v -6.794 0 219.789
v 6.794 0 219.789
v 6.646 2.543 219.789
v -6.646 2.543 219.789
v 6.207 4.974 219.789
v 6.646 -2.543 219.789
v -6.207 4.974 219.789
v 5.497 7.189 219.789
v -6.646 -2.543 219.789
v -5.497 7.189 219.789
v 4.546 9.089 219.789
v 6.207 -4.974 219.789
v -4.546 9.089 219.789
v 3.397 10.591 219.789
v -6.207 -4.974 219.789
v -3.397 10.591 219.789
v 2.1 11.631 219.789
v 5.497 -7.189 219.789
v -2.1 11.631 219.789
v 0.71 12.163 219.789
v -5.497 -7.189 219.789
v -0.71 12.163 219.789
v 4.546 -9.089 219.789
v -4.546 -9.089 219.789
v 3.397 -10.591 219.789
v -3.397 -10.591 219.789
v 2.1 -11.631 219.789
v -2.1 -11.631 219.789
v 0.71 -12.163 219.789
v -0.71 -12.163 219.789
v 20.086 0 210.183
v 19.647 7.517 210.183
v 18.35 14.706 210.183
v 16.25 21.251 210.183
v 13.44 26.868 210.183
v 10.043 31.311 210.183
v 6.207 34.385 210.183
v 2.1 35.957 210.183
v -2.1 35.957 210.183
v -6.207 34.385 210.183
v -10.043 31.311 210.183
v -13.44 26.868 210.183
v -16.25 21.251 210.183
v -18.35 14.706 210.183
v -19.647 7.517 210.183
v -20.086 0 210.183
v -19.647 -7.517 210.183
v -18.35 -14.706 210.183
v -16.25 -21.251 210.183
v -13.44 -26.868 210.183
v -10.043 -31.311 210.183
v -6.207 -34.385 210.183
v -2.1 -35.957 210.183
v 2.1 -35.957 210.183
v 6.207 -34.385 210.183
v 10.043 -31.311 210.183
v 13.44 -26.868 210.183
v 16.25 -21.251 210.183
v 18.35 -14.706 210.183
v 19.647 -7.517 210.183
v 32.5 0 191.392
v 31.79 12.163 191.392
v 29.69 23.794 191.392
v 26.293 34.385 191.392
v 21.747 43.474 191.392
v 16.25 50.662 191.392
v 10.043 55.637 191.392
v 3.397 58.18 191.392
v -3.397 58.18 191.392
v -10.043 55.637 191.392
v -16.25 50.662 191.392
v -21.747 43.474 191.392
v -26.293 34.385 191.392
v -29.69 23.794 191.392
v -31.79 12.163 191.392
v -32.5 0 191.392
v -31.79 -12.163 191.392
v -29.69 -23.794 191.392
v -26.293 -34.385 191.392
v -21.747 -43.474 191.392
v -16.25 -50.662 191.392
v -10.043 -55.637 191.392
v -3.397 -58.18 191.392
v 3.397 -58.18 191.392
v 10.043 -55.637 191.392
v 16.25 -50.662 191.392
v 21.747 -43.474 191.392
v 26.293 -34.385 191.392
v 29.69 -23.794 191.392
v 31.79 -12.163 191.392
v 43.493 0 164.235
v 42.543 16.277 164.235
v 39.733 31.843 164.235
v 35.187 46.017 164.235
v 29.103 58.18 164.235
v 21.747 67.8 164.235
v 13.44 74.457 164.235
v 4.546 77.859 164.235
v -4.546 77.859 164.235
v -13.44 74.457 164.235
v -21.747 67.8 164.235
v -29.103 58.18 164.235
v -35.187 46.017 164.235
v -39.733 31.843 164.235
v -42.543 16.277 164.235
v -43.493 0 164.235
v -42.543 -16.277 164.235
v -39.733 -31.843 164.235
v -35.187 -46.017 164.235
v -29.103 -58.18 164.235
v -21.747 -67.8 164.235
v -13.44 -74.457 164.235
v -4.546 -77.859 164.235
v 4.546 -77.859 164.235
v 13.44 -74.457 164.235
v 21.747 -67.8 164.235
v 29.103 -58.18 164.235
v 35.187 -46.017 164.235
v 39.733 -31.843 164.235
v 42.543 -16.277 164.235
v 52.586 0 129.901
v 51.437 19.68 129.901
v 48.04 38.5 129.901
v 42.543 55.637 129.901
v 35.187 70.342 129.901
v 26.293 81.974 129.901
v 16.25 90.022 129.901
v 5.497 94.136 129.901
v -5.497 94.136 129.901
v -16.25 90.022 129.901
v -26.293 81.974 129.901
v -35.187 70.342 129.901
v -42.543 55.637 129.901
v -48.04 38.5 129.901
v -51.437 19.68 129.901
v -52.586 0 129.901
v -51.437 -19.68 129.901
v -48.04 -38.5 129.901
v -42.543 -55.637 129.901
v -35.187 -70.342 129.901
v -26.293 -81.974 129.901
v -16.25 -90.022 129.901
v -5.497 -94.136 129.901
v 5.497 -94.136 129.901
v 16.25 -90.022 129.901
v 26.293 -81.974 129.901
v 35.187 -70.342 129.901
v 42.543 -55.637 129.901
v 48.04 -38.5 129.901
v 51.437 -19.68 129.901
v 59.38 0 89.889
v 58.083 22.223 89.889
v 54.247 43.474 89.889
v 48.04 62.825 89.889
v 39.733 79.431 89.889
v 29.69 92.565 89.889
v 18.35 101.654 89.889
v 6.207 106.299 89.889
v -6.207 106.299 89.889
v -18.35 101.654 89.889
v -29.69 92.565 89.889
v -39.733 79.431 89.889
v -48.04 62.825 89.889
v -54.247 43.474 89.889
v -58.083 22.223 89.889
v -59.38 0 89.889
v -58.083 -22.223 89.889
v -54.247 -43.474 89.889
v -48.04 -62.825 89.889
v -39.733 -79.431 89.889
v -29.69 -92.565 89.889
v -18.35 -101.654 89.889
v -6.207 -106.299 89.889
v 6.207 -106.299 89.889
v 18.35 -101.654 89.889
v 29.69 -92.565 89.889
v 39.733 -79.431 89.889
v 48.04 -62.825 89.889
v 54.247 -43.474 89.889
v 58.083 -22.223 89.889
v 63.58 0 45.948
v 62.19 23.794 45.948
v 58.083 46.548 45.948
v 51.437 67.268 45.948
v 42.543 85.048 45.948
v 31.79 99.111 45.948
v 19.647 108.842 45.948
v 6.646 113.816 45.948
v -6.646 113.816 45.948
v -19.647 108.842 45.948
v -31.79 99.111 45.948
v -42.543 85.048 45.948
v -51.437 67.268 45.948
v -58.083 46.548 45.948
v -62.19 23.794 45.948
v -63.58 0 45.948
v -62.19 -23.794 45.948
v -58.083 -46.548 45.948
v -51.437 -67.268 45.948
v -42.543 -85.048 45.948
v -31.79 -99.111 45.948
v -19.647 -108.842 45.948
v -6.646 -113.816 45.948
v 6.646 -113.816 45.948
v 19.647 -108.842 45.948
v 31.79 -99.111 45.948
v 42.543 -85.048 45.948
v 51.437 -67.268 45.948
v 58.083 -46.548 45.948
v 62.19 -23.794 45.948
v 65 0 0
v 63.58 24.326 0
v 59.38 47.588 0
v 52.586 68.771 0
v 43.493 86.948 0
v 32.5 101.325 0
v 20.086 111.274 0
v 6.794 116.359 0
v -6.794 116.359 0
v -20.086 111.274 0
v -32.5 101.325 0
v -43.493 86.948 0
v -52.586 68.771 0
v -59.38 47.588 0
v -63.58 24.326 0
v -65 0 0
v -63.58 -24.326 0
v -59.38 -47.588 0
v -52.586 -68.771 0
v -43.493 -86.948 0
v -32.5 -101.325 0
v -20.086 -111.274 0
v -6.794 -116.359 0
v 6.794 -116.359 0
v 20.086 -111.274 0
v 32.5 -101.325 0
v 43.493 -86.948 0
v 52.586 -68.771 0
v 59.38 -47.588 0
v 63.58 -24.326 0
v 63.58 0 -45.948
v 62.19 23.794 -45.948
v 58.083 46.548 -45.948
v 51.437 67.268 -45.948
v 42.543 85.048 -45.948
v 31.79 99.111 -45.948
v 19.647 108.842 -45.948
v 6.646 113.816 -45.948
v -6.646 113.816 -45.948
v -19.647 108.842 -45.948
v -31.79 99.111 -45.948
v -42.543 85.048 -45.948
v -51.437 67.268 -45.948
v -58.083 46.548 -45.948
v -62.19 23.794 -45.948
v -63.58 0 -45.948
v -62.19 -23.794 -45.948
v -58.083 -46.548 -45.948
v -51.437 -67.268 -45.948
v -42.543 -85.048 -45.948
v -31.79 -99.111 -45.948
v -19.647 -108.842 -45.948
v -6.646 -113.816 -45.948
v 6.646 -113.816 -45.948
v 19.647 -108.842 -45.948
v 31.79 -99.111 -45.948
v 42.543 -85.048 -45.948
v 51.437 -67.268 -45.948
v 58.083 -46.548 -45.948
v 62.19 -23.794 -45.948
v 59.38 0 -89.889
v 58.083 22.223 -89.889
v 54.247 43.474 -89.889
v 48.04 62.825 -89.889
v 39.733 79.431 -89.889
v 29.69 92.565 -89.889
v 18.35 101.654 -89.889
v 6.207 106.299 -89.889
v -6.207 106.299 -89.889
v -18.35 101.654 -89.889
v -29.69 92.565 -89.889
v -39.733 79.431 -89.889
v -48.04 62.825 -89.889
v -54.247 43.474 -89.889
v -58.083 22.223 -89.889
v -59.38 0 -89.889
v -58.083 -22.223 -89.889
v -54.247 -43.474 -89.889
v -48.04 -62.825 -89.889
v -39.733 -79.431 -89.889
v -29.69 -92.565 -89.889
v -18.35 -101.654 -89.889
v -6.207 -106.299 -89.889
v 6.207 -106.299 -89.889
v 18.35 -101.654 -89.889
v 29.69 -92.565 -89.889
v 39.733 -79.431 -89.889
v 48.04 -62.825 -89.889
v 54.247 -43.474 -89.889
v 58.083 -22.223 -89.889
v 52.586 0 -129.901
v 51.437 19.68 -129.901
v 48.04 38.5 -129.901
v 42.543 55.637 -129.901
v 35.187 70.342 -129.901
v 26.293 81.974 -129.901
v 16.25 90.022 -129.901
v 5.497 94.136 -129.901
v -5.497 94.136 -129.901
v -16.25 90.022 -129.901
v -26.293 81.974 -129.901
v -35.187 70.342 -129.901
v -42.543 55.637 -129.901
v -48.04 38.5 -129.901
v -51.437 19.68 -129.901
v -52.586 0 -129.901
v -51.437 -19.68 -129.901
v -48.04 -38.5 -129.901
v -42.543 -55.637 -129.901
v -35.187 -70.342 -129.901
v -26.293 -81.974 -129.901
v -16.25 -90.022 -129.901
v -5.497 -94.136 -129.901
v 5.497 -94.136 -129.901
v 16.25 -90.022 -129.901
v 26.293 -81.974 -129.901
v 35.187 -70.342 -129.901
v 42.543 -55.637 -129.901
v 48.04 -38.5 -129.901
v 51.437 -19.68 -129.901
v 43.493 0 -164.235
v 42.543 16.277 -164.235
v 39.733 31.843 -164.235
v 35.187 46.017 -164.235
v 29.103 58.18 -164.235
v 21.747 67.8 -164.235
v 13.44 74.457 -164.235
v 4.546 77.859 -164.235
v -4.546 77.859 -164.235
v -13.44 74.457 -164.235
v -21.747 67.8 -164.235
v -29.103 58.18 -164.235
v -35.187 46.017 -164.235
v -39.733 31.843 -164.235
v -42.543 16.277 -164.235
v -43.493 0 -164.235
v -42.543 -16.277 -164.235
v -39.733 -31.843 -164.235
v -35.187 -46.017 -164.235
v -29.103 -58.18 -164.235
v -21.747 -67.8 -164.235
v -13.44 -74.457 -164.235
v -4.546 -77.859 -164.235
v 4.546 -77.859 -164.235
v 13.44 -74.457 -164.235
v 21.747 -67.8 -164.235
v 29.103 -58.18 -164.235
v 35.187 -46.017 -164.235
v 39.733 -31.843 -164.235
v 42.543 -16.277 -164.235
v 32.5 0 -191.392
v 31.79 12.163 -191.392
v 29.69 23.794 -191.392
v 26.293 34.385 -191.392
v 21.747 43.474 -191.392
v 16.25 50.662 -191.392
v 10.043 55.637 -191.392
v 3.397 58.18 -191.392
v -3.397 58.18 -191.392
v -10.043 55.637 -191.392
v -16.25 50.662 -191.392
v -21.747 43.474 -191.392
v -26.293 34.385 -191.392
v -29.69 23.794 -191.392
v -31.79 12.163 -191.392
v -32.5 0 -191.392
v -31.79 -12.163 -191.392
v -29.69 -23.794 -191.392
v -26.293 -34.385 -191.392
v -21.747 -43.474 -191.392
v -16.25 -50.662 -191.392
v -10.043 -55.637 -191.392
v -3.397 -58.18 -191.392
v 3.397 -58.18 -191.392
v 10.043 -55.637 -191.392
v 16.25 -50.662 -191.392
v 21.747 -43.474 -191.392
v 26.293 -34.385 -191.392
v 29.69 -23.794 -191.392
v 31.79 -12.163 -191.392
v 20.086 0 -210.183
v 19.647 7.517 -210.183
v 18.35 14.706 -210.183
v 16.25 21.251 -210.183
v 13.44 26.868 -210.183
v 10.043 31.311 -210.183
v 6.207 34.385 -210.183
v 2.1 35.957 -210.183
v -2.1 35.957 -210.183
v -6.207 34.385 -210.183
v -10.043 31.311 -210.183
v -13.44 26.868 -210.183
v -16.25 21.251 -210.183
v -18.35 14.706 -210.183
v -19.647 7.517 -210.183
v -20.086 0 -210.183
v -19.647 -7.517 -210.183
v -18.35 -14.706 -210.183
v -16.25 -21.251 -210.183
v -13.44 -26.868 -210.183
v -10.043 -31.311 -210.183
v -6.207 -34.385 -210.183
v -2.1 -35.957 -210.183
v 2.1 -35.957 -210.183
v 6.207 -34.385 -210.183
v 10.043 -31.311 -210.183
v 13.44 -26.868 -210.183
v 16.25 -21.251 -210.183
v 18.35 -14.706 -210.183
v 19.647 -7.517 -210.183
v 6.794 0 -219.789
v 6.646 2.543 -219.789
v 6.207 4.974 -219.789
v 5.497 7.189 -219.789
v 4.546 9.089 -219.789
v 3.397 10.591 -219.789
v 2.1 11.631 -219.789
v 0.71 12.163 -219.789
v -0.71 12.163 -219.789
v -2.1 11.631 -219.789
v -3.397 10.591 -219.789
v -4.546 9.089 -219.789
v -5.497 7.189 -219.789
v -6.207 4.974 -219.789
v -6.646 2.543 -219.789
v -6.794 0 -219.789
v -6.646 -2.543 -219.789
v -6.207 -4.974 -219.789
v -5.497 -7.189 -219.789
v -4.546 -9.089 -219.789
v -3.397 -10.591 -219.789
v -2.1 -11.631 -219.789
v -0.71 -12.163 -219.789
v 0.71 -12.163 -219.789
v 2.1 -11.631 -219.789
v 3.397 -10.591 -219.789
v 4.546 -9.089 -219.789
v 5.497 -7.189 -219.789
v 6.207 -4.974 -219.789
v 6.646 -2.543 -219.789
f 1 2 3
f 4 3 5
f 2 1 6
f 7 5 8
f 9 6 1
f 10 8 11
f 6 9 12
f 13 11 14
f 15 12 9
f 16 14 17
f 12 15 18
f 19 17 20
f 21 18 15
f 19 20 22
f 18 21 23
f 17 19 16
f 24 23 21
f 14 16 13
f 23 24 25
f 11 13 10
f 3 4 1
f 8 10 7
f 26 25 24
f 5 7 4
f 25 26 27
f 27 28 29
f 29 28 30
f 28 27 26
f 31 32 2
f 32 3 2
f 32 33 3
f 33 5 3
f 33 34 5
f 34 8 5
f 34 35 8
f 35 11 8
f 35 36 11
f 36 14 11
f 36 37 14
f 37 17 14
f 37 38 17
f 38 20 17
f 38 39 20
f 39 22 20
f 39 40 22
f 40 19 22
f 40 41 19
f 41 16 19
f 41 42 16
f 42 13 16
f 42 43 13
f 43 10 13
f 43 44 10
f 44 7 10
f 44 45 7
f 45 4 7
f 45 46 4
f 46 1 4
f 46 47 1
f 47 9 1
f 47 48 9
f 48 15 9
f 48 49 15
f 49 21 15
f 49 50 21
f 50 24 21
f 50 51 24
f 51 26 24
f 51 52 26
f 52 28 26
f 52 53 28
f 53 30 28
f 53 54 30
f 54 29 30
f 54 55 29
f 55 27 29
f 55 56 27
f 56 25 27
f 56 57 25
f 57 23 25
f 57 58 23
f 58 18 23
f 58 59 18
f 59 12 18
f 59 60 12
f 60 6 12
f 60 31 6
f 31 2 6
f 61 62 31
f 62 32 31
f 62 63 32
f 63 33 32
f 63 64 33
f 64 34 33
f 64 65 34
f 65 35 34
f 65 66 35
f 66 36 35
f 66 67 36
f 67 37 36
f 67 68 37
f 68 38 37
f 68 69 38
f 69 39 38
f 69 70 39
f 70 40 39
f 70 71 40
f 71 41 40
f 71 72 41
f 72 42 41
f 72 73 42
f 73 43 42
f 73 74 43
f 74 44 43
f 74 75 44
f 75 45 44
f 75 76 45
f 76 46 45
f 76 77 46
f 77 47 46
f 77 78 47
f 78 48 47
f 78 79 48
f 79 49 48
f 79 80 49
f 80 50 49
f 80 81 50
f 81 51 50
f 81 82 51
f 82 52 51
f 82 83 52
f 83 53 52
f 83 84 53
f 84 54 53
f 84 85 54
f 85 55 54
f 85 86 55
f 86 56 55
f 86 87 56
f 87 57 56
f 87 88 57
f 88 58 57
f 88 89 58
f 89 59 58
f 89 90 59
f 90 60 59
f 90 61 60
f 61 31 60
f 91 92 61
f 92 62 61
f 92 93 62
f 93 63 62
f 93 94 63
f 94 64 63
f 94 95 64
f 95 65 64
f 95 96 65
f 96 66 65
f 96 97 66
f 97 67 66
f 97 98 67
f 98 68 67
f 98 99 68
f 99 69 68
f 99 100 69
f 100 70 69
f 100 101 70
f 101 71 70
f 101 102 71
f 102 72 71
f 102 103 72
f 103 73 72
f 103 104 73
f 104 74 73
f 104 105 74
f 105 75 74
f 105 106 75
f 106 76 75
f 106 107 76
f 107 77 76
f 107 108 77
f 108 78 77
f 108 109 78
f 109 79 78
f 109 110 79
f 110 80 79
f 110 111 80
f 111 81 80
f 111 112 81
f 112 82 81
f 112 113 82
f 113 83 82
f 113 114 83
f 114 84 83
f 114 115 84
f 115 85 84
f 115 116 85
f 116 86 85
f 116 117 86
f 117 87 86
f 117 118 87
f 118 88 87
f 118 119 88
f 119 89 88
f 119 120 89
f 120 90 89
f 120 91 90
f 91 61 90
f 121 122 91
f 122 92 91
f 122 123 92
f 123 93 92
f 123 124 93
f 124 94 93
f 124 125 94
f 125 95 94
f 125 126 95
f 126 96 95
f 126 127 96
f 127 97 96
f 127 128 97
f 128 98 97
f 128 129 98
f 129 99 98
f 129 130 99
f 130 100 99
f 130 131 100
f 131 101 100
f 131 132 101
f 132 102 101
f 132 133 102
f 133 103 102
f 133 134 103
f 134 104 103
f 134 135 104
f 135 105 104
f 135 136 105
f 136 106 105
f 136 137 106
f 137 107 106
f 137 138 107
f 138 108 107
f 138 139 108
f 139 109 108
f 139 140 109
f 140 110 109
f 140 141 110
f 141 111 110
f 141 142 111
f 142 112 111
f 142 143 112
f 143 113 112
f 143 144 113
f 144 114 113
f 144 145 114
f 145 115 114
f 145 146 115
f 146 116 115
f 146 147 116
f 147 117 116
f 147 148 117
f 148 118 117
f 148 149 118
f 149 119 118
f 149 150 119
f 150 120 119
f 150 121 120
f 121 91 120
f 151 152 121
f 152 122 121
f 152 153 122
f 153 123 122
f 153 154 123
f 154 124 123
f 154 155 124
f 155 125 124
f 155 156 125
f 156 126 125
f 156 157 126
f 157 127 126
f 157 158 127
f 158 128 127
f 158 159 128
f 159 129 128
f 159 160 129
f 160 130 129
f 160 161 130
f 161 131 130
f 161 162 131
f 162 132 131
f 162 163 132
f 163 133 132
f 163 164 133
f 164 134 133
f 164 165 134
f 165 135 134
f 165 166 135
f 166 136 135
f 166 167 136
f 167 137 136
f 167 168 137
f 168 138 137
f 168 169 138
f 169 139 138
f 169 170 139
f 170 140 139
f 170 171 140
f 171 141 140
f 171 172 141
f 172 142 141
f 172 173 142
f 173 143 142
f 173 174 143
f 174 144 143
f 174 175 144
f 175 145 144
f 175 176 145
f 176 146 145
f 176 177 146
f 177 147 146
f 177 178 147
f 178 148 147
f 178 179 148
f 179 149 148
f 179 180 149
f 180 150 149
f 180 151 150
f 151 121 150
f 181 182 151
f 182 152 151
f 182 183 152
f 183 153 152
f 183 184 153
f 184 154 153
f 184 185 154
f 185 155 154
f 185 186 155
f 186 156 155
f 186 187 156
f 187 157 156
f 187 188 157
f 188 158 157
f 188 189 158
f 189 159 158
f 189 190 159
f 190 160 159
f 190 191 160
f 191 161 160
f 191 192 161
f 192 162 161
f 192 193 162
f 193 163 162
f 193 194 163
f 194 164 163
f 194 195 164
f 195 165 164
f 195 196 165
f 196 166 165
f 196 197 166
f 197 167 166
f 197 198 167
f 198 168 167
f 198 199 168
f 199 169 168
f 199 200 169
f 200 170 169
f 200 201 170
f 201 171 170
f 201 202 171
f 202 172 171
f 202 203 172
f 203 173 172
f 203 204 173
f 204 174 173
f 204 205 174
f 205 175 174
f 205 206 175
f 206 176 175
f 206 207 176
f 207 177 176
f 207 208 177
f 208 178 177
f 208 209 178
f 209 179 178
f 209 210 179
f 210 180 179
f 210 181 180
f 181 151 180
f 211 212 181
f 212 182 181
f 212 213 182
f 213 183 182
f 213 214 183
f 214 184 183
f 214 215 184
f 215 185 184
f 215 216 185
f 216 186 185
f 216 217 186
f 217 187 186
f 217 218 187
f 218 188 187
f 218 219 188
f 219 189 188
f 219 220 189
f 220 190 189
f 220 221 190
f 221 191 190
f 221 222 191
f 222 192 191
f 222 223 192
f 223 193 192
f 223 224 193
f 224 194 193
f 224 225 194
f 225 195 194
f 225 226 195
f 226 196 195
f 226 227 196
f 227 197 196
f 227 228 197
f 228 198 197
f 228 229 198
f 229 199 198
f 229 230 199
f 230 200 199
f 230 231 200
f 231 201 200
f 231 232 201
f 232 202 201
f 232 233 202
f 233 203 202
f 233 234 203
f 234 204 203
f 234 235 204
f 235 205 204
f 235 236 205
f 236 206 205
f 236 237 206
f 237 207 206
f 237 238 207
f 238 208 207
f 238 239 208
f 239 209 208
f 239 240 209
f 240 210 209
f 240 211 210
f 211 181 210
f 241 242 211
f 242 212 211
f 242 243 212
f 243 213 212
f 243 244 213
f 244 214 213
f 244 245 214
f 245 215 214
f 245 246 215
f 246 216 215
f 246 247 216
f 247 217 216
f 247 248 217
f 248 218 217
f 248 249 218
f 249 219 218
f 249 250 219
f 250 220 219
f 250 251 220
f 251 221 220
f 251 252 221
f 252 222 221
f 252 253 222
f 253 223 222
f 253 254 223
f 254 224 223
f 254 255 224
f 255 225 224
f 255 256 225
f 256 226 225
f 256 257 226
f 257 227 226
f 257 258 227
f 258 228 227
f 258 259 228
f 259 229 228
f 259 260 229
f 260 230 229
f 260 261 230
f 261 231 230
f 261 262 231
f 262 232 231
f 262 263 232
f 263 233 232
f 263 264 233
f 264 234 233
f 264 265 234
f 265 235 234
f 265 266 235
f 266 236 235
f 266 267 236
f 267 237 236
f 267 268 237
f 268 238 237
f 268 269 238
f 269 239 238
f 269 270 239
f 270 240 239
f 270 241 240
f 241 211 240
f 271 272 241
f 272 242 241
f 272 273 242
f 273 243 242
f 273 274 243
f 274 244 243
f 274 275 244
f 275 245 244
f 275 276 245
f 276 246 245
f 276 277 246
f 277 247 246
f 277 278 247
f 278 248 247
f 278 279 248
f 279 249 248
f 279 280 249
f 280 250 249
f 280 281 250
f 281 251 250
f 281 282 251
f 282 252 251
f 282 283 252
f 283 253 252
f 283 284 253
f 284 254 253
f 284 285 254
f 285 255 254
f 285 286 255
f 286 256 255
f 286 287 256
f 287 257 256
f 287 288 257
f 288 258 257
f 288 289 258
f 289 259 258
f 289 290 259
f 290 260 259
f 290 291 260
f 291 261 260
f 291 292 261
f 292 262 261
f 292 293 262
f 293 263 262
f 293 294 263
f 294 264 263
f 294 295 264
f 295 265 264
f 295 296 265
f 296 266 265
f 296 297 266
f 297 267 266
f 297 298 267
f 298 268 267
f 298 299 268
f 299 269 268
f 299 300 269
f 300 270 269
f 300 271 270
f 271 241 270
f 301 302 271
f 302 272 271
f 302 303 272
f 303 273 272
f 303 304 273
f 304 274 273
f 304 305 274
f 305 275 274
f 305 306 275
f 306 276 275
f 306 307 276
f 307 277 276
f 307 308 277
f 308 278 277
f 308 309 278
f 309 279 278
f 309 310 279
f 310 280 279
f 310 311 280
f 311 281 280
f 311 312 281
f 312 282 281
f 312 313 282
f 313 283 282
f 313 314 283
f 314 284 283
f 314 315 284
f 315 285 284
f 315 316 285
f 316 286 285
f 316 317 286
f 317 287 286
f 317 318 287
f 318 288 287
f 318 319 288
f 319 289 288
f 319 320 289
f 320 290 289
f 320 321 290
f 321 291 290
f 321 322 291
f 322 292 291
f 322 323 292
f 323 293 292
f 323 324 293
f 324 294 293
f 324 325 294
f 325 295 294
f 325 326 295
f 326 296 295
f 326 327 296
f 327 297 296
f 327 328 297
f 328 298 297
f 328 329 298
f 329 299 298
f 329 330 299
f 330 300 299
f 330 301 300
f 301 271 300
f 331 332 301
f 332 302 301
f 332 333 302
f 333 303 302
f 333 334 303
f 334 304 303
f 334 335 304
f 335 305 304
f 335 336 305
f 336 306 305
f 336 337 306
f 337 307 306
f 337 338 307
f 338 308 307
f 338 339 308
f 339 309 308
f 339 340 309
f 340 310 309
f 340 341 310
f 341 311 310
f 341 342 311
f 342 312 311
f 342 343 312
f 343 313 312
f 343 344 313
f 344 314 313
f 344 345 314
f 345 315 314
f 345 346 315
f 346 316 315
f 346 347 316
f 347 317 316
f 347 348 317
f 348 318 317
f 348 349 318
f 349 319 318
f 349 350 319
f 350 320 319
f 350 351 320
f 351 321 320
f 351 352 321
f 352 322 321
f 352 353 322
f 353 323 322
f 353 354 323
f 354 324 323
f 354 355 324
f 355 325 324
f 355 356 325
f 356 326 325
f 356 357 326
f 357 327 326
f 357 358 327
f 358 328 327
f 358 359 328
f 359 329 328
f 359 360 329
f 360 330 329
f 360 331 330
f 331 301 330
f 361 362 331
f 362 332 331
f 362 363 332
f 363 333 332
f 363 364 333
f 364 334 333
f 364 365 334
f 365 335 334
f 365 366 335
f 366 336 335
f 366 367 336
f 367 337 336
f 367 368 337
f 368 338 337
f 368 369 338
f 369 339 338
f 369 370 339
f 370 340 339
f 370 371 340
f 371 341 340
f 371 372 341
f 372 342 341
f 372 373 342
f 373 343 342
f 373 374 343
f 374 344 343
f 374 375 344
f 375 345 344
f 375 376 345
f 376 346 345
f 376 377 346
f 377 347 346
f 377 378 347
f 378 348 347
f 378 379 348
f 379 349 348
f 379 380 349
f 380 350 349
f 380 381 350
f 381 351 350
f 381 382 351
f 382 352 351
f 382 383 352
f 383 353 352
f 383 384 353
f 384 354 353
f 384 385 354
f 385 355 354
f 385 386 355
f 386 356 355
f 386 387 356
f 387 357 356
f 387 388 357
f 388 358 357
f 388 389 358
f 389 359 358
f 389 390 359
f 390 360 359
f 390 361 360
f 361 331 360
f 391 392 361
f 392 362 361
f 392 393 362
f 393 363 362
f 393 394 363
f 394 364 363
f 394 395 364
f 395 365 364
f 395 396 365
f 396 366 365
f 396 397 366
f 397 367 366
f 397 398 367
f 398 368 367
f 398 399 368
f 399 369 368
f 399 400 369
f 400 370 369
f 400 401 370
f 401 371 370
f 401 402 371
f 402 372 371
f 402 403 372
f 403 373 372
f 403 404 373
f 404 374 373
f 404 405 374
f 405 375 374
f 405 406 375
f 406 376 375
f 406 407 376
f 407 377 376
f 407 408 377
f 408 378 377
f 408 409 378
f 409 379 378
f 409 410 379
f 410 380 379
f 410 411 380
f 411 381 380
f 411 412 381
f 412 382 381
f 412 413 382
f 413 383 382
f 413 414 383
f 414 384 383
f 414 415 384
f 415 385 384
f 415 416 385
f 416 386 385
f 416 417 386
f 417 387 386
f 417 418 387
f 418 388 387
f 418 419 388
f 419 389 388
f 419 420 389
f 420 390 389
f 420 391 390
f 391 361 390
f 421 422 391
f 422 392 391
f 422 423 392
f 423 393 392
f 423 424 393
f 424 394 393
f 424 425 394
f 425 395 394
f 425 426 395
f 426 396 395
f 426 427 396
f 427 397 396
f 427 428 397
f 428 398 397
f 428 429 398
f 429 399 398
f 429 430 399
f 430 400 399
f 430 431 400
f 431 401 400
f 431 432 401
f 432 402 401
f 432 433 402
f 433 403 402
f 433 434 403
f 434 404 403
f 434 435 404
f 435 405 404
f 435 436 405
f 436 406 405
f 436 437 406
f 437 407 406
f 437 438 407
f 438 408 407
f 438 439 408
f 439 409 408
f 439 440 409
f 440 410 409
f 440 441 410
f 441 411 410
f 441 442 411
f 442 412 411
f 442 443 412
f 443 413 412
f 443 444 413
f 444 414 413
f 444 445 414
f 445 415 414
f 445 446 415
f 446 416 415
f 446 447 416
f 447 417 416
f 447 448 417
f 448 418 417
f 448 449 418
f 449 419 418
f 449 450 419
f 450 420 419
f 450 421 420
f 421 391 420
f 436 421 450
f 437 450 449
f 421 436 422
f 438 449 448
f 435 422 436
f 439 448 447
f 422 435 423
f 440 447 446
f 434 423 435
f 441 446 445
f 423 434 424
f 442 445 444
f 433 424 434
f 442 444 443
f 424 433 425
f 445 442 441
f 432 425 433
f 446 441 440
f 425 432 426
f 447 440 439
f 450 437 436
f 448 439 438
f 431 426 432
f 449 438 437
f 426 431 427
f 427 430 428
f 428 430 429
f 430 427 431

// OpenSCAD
// Generated by SolidPython 1.0.1 on 2020-07-29 00:46:46


scale(v = [5, 9, 17]) {
	sphere(r = 13);
}
/***********************************************
*********      SolidPython code:      **********
************************************************
 
# import packages: SolidPython
from solid import *
from solid.utils import *
from itertools import chain, combinations, permutations


class Resize:

    def __init__(self, scad_file):
        self.scad_file = scad_file
        #self.scad_file = import_scad(scad_file)
        # cone/cylinder param:
        self.r1 = 0
        self.r2 = 0
        self.h = 0
        # rectangular prism param:
        self.w = 0
        self.l = 0
        # ellipse param:
        self.r = 0

    # import OpenScad code (file name corresponds to shape)


    # classify shape + parameters
    def assign(self, param1, param2, param3):
        if self.scad_file == 'cone.scad':
            self.r1 = param1
            self.r2 = param2
            self.h = param3
        elif self.scad_file == 'cylinder.scad':
            self.r1 = param1
            self.r2 = param2
            self.h = param3
        elif self.scad_file == 'rectangularPrism.scad':
            self.h = param1
            self.l = param2
            self.w = param3
        else:
            self.r = param1
            self.h = param2

    # resize parameters
    def iterate(self):
        x = range(3, 20, 2)
        i = 1
        if self.scad_file == 'cone.scad':
            tempList = list(permutations(x, 2))
            for temp in tempList:
                param1 = temp[0]
                param2 = temp[1]
                filepath = 'produced_scad_files/' + 'cone' + str(param1) + '_' + str(param2) + '_' + '.scad'
                scad_render_to_file(cylinder(h=param1, r1=param2, r2=0), filepath)

        elif self.scad_file == 'cylinder.scad':
            tempList = list(permutations(x, 3))
            for temp in tempList:
                param1 = temp[0]
                param2 = temp[1]
                filepath = 'produced_scad_files/' + 'cylinder' + str(param1) + '_' + str(param2) + '_' + '.scad'
                scad_render_to_file(cylinder(h=param1, r1=param2, r2=param2), filepath)

        elif self.scad_file == 'rectangularPrism.scad':
            tempList = list(permutations(x, 3))
            for temp in tempList:
                param1 = temp[0]
                param2 = temp[1]
                param3 = temp[2]
                filepath = 'produced_scad_files/' + 'rectangularPrism' + str(param1) + '_' + str(param2) + '_' + str(
                    param3) + '.scad'
                scad_render_to_file(cube(size=(param1, param2, param3)), filepath)

        elif self.scad_file == 'ellipse.scad':
            tempList = list(permutations(x, 4))
            for temp in tempList:
                param1 = temp[0]
                param2 = temp[1]
                param3 = temp[2]
                param4 = temp[3]
                filepath = 'produced_scad_files/' + 'ellipse' + str(param1) + '_' + str(param2) + '_' + str(param3) + '_' + str(param4) + '.scad'
                scad_render_to_file(scale([param1, param2, param3])(sphere(r=param4)), filepath)

    def render_to_scadfile(self):
        scad_render_to_file(scad, 'example.scad') 
 
************************************************/
